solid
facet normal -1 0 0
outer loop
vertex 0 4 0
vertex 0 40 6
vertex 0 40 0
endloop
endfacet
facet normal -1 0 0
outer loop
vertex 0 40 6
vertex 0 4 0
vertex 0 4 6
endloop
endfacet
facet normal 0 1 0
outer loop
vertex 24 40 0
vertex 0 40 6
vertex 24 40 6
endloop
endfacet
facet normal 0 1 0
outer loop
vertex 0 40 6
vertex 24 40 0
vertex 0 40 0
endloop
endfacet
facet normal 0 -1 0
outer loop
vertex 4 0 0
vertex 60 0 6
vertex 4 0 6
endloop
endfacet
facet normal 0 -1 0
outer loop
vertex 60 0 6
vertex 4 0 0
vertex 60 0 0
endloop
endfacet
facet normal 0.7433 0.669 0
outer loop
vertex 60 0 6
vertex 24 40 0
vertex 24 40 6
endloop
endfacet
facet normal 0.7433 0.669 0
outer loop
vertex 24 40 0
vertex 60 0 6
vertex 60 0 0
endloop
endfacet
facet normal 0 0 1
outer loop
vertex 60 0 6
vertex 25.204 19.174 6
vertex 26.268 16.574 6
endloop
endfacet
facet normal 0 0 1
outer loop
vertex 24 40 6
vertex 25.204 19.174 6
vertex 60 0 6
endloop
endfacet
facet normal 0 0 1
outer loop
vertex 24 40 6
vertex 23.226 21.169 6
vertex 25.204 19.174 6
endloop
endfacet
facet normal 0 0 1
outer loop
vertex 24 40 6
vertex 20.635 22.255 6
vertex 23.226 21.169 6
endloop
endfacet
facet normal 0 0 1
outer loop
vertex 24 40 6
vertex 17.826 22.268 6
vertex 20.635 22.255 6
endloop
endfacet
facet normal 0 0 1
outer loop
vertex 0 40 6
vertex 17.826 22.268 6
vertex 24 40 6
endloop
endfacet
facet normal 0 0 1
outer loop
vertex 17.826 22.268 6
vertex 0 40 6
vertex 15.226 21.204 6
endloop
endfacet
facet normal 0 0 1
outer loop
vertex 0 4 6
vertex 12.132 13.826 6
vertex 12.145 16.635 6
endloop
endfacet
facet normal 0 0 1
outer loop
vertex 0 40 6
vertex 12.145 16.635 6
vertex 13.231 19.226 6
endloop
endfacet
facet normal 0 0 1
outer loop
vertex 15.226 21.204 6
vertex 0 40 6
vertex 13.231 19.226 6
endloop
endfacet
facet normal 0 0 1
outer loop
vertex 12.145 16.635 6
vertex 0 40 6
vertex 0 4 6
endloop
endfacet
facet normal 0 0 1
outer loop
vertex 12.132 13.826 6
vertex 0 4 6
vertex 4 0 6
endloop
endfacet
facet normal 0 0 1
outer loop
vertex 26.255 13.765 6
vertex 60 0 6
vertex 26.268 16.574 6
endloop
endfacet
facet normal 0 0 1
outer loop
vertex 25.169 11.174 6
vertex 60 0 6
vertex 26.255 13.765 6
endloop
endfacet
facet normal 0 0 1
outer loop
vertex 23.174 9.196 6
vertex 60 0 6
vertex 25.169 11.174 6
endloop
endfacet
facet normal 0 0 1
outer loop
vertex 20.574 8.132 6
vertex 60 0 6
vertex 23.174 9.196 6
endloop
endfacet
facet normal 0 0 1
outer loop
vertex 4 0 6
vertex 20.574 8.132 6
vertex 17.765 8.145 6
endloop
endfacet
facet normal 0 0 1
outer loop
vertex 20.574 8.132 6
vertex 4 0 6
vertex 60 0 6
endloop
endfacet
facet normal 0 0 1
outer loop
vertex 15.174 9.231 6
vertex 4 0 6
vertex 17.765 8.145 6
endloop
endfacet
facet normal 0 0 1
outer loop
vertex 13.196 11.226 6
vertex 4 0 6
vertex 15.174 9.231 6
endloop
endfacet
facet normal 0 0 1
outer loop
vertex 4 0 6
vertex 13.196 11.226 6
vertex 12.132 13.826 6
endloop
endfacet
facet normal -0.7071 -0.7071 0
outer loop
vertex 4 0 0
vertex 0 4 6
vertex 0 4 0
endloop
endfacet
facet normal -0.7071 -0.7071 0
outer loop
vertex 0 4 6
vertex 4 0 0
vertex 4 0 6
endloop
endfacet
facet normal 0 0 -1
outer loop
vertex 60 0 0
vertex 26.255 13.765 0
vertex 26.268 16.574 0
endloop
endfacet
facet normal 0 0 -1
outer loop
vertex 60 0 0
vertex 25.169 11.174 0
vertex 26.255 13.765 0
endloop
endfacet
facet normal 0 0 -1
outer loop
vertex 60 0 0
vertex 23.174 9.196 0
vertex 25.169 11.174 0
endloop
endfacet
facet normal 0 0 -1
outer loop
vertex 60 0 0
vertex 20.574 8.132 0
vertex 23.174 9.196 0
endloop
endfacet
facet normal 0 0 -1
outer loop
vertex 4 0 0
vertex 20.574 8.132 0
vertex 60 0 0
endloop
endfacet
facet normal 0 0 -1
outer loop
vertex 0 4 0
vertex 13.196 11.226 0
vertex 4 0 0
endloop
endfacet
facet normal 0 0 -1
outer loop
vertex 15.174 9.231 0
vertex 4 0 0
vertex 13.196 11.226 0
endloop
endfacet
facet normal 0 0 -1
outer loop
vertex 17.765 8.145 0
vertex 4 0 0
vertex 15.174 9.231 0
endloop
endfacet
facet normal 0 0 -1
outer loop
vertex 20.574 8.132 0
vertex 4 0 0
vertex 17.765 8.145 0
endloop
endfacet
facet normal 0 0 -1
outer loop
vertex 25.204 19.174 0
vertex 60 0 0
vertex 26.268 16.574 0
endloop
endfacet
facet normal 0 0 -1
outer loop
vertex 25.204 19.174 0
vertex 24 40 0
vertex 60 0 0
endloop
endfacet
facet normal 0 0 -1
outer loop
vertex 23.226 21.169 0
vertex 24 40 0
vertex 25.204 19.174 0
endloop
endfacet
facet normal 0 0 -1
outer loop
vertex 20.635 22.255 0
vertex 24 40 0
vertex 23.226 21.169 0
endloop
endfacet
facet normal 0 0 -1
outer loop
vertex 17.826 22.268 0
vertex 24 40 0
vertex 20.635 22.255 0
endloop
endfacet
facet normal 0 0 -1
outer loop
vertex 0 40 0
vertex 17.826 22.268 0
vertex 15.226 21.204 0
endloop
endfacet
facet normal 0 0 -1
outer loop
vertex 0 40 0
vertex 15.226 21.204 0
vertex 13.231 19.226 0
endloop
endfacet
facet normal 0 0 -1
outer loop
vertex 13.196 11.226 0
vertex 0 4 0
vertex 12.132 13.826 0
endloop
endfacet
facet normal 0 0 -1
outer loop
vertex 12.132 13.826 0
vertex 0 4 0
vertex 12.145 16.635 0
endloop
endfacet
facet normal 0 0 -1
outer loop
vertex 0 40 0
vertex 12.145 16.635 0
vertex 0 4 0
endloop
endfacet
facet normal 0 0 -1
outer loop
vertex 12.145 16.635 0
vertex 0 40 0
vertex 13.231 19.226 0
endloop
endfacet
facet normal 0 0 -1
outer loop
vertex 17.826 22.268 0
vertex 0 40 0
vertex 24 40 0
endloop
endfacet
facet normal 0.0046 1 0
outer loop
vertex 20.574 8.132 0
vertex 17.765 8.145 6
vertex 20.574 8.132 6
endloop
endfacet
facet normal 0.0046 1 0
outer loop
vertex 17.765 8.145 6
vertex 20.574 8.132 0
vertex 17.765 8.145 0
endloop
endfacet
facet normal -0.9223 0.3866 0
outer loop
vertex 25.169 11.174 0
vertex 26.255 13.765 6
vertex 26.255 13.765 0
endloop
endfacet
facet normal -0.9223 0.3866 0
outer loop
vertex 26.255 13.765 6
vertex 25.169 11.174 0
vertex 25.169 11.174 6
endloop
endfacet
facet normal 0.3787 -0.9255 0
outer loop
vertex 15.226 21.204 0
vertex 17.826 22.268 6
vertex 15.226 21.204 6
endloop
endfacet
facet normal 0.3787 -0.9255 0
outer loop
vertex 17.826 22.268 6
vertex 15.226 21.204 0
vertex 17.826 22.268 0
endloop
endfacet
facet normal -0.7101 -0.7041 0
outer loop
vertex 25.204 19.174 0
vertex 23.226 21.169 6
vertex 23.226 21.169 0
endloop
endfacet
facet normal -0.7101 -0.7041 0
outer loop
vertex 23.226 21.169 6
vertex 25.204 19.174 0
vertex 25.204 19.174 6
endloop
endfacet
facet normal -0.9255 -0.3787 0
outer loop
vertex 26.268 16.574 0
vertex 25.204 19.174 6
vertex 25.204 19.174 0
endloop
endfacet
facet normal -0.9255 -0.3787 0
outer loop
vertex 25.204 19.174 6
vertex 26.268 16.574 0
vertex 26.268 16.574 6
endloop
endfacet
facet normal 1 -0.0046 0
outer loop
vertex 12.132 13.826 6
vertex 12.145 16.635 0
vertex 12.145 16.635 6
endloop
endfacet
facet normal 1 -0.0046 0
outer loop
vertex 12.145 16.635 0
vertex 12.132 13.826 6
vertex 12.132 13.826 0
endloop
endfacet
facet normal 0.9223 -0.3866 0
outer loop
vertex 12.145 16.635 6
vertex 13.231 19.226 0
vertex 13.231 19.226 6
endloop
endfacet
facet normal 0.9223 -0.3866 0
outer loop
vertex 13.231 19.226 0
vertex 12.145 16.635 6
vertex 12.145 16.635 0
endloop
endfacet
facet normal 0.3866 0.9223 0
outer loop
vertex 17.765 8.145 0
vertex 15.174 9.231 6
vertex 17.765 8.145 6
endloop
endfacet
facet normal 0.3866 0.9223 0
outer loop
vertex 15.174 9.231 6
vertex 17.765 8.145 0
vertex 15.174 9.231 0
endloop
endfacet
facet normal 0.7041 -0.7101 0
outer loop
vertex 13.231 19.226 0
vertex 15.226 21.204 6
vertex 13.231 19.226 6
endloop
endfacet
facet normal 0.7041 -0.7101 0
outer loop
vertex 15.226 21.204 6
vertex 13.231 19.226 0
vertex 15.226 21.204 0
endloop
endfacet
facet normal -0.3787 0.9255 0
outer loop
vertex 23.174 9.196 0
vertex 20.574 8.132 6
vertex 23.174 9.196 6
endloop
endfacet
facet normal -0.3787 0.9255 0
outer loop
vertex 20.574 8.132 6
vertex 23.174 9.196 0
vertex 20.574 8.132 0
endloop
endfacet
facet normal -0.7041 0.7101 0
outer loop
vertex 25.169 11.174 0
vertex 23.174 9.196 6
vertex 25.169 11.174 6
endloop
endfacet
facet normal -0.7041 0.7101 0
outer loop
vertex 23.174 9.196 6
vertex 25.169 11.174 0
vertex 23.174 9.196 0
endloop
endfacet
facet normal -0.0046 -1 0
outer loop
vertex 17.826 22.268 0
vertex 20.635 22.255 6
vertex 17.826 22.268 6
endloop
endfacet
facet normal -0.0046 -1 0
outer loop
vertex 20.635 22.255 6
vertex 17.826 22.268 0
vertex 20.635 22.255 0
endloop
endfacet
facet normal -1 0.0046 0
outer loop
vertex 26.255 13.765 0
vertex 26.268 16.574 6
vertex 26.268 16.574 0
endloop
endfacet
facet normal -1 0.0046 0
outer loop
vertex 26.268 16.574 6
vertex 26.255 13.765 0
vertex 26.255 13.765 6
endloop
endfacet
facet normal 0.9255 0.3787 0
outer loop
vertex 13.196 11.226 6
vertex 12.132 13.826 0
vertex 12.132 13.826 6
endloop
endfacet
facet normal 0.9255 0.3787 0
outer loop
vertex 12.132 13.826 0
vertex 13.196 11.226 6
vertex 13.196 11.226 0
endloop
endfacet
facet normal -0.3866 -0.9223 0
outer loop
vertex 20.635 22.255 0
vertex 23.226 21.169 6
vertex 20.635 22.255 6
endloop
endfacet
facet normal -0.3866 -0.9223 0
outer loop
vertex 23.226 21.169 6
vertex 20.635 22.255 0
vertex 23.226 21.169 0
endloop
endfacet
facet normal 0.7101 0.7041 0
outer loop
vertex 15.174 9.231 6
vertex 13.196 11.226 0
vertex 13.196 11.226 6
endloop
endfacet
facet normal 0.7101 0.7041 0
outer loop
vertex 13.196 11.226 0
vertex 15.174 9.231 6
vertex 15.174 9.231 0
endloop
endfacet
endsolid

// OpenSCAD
$fn = 32;

// ----------------------------------------------------------------------
// Bracket plate: gusset 60 x 40
// ----------------------------------------------------------------------

// --- parameters (mm) ---
hole_r = 4;               // bolt hole radius
plate_t = 6;              // plate thickness, Z (extrusion height)
gus_a = 60;               // base length
gus_b = 40;               // height
top_x = 24;               // top edge X of the angled cut
light_r = 7.2;            // lightening hole radius

light_d = 2 * light_r;

profile = [[4, 0], [30, 0], [60, 0], [24, 40], [0, 40], [0, 4]];  // primary outline, 6 points, counter clockwise
void_1 = [[26.268, 16.574], [25.204, 19.174], [23.226, 21.169], [20.635, 22.255], [17.826, 22.268], [15.226, 21.204], [13.231, 19.226], [12.145, 16.635], [12.132, 13.826], [13.196, 11.226], [15.174, 9.231], [17.765, 8.145], [20.574, 8.132], [23.174, 9.196], [25.169, 11.174], [26.255, 13.765]];  // lightening hole, 16 points

// --- the one profile operation ---
difference() {
  linear_extrude(height = plate_t) polygon(points = profile);
  translate([0, 0, -1])
    linear_extrude(height = plate_t + 2) polygon(points = void_1);
}
